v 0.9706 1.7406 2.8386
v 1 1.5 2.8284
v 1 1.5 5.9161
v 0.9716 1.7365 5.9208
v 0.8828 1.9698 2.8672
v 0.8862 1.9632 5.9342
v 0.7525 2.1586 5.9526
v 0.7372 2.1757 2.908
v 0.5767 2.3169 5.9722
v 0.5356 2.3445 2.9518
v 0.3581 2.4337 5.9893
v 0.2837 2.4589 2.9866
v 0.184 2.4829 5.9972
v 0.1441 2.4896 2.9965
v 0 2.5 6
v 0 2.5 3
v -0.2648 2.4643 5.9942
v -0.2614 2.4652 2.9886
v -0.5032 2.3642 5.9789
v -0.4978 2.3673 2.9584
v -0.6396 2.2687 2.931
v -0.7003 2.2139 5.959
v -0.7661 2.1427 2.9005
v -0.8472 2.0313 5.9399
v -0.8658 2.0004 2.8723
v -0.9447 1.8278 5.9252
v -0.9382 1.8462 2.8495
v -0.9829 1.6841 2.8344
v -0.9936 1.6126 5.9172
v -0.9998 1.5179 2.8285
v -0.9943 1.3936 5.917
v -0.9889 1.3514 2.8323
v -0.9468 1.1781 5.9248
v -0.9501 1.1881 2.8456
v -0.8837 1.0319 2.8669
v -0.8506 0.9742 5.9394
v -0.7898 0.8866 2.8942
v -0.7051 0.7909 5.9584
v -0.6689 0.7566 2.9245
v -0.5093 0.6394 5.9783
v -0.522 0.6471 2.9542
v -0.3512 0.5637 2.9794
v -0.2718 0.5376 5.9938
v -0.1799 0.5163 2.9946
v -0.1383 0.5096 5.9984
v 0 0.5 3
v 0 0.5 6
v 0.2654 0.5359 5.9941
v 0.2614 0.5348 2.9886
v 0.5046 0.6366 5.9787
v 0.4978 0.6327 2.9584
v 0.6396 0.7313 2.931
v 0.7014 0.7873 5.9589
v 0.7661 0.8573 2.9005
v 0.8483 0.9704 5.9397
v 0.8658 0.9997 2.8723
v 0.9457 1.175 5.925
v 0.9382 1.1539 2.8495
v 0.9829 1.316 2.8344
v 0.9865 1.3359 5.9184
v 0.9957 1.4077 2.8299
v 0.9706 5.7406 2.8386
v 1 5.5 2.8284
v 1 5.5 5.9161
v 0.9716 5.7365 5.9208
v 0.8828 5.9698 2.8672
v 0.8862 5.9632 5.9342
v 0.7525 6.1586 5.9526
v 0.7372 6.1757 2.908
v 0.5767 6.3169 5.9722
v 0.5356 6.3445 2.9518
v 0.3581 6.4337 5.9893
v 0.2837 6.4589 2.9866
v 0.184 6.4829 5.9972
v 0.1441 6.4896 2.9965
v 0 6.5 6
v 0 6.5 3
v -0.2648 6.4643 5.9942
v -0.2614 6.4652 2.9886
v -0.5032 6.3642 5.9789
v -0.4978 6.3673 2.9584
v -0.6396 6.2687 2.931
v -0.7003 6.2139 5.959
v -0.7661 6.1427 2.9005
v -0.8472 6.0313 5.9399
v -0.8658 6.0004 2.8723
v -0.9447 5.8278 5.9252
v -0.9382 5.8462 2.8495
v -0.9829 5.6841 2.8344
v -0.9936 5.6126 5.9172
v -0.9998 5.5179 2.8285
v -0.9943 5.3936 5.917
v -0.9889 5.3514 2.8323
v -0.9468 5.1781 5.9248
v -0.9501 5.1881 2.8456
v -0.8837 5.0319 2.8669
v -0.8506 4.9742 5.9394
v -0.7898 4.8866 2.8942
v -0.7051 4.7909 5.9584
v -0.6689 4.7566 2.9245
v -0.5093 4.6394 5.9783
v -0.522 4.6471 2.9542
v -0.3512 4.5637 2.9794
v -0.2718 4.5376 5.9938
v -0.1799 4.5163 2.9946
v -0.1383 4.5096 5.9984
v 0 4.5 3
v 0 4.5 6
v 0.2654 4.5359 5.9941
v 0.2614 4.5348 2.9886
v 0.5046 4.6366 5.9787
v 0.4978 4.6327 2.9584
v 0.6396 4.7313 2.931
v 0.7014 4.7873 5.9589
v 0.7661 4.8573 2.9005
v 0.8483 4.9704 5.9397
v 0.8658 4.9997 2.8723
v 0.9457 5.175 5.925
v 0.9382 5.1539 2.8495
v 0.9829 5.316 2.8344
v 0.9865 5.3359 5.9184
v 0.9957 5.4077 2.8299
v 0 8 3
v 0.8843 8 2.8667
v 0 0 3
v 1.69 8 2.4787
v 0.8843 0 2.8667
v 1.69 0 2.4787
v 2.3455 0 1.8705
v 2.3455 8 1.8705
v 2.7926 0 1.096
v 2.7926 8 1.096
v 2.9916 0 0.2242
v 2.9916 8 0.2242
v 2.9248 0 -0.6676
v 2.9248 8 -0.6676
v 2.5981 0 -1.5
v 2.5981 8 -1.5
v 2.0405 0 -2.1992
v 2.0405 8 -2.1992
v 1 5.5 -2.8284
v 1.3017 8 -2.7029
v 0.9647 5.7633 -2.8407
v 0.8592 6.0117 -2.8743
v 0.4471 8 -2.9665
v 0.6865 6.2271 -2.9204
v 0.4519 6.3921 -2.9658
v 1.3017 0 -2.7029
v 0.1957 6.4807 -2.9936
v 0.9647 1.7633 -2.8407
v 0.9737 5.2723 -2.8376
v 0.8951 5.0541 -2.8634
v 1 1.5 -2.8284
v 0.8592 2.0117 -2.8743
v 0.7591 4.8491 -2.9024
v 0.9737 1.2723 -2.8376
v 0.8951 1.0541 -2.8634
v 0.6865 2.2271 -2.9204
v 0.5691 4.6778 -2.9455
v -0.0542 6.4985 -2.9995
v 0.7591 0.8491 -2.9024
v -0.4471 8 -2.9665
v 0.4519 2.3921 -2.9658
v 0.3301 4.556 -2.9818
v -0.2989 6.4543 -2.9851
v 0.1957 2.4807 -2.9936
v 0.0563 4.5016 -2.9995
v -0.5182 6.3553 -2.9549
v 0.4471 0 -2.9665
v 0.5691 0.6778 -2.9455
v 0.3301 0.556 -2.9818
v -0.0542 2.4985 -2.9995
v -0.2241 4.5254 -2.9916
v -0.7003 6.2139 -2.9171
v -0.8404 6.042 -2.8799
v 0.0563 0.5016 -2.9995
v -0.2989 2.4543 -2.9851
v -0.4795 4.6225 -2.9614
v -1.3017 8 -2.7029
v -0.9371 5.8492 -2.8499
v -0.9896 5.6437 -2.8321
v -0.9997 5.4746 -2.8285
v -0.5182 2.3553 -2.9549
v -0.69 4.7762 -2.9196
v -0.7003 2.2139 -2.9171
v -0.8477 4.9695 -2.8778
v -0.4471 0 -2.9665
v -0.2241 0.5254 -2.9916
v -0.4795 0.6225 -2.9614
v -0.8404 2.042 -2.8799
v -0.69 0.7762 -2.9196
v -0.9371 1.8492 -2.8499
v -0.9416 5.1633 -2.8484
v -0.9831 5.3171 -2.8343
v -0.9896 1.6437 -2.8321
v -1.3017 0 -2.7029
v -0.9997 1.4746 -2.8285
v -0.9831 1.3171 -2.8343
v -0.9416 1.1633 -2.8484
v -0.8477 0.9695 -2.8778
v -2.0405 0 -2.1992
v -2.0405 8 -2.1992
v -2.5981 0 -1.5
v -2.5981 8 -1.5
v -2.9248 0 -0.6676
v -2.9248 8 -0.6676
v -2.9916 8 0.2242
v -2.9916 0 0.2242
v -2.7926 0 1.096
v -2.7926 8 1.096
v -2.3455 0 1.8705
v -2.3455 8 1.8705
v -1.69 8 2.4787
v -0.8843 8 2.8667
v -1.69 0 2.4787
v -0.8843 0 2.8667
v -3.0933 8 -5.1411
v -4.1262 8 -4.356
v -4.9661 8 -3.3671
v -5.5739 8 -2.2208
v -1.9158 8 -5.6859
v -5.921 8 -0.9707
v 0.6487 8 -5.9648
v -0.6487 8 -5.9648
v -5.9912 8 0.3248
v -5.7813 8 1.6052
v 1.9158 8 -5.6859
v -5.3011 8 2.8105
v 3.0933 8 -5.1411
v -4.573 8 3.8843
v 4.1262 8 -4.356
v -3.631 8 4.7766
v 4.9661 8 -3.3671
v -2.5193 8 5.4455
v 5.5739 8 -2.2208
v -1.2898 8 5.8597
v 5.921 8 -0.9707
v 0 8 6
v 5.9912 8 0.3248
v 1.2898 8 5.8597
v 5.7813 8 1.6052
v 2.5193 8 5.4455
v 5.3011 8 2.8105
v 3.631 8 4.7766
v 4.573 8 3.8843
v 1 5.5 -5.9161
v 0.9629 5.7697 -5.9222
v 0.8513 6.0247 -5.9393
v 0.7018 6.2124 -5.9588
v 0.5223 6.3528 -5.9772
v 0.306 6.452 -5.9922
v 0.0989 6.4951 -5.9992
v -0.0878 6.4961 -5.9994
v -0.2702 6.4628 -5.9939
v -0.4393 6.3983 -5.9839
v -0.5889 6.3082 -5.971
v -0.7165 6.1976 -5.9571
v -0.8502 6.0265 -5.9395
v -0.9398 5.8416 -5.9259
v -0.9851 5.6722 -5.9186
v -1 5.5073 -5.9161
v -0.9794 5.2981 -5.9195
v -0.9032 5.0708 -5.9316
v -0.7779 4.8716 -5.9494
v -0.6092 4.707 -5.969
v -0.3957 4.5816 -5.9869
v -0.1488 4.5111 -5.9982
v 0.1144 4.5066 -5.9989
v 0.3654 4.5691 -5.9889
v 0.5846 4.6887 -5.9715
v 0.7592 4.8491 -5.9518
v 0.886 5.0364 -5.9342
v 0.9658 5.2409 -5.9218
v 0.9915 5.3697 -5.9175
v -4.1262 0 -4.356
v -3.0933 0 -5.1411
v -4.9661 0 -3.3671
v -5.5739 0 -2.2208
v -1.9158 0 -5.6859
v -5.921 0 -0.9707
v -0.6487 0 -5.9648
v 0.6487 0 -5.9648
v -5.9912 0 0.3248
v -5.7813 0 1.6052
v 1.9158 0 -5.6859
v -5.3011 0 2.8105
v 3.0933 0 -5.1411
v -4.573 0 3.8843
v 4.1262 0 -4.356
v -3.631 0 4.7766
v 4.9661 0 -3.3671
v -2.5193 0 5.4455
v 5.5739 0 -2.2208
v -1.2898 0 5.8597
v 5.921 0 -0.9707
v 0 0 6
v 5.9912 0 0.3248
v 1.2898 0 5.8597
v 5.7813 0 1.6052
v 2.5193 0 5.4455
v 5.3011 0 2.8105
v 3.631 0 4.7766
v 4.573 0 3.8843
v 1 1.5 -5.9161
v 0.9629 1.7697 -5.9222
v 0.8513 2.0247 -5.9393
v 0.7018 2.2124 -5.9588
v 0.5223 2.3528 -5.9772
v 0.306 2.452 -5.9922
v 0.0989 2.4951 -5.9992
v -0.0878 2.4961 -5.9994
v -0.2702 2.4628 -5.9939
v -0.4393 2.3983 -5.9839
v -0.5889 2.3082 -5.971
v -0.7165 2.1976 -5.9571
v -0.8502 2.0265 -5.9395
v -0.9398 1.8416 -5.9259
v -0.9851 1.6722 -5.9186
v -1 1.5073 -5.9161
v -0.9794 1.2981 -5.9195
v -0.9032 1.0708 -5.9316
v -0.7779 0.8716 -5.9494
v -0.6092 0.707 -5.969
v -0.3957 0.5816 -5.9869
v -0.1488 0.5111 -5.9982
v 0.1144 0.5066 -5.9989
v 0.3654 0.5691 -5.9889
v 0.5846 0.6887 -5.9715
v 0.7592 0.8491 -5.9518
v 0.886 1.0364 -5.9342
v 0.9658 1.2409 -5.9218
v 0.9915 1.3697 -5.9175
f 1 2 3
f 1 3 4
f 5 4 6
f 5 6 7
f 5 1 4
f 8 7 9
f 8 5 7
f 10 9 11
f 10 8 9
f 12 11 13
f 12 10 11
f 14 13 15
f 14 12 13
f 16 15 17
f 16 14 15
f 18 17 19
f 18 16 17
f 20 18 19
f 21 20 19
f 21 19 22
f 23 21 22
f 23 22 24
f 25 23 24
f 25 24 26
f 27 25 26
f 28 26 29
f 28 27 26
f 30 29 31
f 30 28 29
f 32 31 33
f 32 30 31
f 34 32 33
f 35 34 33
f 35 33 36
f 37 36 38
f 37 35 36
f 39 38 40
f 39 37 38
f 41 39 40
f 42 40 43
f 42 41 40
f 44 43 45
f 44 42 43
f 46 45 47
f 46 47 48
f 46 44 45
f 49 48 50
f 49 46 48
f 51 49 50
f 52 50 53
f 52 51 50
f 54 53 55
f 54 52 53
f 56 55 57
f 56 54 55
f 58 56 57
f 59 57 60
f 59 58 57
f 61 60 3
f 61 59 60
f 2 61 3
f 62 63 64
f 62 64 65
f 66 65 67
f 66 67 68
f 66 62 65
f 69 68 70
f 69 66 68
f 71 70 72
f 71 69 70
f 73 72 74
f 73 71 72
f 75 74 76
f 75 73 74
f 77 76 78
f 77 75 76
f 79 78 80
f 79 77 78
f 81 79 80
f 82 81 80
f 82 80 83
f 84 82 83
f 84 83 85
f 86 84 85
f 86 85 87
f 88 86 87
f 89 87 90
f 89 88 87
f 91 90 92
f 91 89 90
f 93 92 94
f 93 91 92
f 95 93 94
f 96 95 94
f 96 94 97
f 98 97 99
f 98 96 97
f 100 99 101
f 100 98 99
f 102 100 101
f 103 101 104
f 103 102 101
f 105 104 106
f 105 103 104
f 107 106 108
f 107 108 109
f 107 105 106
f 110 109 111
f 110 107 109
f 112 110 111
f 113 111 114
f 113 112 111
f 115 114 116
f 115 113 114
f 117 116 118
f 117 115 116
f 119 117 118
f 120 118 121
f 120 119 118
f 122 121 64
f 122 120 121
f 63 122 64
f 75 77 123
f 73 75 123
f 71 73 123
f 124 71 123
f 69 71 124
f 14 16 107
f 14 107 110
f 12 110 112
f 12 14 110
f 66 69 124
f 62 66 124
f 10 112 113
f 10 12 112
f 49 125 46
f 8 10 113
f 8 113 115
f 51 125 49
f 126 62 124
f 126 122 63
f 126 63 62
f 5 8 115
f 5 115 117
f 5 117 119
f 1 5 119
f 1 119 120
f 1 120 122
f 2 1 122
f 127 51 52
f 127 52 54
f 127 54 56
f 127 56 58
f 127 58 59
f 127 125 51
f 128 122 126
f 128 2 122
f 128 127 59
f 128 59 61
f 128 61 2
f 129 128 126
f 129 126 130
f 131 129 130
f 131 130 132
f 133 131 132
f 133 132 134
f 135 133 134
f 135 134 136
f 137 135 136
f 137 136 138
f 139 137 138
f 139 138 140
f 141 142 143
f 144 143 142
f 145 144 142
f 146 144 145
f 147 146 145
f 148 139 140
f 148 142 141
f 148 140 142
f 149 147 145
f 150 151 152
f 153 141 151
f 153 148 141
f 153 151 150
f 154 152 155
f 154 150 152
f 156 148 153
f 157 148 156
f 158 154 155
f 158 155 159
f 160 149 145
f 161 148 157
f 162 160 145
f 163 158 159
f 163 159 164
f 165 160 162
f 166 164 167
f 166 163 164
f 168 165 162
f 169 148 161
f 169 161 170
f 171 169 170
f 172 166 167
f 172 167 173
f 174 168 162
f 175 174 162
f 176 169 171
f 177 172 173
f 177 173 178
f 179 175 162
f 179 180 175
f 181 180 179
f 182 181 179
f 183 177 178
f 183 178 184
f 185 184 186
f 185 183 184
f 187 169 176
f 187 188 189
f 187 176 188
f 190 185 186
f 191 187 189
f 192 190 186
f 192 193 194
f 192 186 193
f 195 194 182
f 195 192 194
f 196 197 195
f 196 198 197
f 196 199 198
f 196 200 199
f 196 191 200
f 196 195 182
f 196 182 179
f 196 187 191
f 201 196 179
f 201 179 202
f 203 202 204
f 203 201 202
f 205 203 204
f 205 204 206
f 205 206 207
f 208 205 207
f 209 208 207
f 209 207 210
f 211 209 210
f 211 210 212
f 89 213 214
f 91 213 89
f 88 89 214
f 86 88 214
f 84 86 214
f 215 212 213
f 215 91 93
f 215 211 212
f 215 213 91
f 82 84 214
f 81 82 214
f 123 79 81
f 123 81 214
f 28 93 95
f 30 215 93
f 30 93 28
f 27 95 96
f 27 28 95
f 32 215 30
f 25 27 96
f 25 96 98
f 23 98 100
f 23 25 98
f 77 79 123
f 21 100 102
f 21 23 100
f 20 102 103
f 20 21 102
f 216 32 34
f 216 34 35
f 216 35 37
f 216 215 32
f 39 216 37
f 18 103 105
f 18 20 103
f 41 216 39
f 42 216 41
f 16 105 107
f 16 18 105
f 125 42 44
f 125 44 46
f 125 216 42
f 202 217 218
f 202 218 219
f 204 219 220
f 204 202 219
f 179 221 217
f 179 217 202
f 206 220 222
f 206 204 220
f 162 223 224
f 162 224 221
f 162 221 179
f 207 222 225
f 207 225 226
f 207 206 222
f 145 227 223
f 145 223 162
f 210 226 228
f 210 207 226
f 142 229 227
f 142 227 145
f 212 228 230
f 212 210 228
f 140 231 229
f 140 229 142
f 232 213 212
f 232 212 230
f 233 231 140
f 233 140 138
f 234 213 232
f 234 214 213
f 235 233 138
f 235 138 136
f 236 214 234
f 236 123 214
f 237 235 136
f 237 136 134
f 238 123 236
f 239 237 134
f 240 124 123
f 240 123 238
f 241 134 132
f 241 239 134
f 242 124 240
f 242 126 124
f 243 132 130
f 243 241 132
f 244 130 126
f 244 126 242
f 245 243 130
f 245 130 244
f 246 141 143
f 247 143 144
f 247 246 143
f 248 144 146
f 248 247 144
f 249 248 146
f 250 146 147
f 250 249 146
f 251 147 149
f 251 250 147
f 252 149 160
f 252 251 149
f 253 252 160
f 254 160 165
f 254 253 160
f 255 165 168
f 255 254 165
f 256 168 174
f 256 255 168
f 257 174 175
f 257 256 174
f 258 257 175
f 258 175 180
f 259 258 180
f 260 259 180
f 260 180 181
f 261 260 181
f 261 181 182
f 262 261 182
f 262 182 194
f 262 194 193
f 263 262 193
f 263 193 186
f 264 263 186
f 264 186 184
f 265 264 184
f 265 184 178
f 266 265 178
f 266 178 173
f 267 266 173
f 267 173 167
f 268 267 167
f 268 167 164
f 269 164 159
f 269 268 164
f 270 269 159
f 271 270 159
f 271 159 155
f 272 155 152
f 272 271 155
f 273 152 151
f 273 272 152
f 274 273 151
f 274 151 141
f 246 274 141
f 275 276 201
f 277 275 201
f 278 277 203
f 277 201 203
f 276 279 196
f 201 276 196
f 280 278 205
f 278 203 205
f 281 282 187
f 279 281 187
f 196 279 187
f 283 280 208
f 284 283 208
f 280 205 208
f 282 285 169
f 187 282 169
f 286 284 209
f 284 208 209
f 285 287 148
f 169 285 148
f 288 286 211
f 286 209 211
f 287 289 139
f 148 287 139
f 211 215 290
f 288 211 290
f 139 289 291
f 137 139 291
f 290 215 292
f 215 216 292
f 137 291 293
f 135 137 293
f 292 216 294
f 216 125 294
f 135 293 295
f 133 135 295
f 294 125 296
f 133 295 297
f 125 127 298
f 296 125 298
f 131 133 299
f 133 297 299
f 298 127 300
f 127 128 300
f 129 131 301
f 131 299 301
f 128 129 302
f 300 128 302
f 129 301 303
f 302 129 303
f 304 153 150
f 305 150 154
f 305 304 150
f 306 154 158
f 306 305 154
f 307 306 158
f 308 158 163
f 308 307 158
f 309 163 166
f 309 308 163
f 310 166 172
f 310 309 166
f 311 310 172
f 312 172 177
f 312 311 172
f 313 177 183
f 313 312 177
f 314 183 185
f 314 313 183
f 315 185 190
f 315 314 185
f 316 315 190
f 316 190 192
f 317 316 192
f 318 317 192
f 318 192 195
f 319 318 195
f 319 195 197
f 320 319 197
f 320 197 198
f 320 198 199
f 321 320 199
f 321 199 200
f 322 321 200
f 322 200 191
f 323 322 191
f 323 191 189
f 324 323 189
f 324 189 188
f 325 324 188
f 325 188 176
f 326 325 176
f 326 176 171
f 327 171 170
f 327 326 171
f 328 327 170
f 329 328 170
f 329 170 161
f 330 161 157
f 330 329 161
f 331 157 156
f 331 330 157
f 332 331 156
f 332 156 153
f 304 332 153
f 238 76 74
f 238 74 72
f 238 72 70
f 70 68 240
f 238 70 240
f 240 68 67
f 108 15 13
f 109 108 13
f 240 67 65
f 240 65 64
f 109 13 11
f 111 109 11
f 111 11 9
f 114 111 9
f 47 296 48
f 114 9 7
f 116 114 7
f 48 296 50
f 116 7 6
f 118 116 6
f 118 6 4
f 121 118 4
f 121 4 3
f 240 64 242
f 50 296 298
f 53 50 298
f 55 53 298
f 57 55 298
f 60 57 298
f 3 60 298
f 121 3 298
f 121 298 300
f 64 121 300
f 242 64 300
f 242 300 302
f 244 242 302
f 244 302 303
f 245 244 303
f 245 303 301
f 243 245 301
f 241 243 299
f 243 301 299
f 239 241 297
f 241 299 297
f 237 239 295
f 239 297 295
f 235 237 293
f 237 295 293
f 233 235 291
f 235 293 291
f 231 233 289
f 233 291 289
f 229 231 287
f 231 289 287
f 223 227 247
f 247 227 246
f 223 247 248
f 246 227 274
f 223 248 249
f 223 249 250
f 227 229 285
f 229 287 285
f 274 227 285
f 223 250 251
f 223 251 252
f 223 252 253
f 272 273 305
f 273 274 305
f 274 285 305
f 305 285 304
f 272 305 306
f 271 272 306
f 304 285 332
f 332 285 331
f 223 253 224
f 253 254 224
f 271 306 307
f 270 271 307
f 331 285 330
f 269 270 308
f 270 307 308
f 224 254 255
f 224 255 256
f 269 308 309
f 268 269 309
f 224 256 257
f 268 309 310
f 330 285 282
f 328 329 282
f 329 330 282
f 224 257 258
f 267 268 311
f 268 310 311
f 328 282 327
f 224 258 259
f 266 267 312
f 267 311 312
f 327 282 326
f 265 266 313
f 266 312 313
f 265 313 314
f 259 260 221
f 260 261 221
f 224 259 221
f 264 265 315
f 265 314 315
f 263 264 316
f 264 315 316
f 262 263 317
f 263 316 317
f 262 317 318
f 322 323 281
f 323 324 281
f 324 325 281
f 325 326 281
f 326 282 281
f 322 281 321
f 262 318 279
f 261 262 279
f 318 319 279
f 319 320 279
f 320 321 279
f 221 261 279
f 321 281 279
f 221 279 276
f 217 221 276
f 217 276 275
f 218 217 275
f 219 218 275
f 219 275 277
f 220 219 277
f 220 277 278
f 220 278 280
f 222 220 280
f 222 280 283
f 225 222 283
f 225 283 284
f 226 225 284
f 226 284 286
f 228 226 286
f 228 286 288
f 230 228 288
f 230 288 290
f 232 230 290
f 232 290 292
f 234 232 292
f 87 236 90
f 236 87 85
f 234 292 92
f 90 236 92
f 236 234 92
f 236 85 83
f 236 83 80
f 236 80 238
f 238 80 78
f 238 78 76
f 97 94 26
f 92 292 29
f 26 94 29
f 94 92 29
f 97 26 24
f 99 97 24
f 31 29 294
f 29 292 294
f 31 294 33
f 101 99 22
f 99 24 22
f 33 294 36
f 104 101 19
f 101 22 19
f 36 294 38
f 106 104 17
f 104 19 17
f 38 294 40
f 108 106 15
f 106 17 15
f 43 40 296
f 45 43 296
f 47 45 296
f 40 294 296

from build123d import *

# Parameters (mm, degrees)
SKETCH1_R              = 6
SKETCH1_R_2            = 3
BOSS_EXTRUDE1_DEPTH    = 8
CUT_EXTRUDE1_START     = -6.000000101
CUT_EXTRUDE1_OUTLINE_R = 1
CUT_EXTRUDE1_DEPTH     = 12.000000201


# Read off the part's stored shape, not the designer's step: Cut-Extrude1
with BuildPart() as part:
    # Sketch1 → Boss-Extrude1 (new body)
    with BuildSketch(Plane(origin=(0, 0, 0), x_dir=(1, 0, 0), z_dir=(0, 1, 0))):
        with Locations(Location((0, 0, 0), (0, 0, 270))):
            Circle(SKETCH1_R)
        with Locations(Location((0, 0, 0), (0, 0, 270))):
            Circle(SKETCH1_R_2, mode=Mode.SUBTRACT)
    extrude(amount=BOSS_EXTRUDE1_DEPTH)

    # Cut-Extrude1 outline → Cut-Extrude1 (cut)
    with BuildSketch(Plane.XY.offset(CUT_EXTRUDE1_START)):
        with Locations((0, 1.5)):
            Circle(CUT_EXTRUDE1_OUTLINE_R)
        with Locations((0, 5.5)):
            Circle(CUT_EXTRUDE1_OUTLINE_R)
    extrude(amount=CUT_EXTRUDE1_DEPTH, mode=Mode.SUBTRACT)


solid = part.part
